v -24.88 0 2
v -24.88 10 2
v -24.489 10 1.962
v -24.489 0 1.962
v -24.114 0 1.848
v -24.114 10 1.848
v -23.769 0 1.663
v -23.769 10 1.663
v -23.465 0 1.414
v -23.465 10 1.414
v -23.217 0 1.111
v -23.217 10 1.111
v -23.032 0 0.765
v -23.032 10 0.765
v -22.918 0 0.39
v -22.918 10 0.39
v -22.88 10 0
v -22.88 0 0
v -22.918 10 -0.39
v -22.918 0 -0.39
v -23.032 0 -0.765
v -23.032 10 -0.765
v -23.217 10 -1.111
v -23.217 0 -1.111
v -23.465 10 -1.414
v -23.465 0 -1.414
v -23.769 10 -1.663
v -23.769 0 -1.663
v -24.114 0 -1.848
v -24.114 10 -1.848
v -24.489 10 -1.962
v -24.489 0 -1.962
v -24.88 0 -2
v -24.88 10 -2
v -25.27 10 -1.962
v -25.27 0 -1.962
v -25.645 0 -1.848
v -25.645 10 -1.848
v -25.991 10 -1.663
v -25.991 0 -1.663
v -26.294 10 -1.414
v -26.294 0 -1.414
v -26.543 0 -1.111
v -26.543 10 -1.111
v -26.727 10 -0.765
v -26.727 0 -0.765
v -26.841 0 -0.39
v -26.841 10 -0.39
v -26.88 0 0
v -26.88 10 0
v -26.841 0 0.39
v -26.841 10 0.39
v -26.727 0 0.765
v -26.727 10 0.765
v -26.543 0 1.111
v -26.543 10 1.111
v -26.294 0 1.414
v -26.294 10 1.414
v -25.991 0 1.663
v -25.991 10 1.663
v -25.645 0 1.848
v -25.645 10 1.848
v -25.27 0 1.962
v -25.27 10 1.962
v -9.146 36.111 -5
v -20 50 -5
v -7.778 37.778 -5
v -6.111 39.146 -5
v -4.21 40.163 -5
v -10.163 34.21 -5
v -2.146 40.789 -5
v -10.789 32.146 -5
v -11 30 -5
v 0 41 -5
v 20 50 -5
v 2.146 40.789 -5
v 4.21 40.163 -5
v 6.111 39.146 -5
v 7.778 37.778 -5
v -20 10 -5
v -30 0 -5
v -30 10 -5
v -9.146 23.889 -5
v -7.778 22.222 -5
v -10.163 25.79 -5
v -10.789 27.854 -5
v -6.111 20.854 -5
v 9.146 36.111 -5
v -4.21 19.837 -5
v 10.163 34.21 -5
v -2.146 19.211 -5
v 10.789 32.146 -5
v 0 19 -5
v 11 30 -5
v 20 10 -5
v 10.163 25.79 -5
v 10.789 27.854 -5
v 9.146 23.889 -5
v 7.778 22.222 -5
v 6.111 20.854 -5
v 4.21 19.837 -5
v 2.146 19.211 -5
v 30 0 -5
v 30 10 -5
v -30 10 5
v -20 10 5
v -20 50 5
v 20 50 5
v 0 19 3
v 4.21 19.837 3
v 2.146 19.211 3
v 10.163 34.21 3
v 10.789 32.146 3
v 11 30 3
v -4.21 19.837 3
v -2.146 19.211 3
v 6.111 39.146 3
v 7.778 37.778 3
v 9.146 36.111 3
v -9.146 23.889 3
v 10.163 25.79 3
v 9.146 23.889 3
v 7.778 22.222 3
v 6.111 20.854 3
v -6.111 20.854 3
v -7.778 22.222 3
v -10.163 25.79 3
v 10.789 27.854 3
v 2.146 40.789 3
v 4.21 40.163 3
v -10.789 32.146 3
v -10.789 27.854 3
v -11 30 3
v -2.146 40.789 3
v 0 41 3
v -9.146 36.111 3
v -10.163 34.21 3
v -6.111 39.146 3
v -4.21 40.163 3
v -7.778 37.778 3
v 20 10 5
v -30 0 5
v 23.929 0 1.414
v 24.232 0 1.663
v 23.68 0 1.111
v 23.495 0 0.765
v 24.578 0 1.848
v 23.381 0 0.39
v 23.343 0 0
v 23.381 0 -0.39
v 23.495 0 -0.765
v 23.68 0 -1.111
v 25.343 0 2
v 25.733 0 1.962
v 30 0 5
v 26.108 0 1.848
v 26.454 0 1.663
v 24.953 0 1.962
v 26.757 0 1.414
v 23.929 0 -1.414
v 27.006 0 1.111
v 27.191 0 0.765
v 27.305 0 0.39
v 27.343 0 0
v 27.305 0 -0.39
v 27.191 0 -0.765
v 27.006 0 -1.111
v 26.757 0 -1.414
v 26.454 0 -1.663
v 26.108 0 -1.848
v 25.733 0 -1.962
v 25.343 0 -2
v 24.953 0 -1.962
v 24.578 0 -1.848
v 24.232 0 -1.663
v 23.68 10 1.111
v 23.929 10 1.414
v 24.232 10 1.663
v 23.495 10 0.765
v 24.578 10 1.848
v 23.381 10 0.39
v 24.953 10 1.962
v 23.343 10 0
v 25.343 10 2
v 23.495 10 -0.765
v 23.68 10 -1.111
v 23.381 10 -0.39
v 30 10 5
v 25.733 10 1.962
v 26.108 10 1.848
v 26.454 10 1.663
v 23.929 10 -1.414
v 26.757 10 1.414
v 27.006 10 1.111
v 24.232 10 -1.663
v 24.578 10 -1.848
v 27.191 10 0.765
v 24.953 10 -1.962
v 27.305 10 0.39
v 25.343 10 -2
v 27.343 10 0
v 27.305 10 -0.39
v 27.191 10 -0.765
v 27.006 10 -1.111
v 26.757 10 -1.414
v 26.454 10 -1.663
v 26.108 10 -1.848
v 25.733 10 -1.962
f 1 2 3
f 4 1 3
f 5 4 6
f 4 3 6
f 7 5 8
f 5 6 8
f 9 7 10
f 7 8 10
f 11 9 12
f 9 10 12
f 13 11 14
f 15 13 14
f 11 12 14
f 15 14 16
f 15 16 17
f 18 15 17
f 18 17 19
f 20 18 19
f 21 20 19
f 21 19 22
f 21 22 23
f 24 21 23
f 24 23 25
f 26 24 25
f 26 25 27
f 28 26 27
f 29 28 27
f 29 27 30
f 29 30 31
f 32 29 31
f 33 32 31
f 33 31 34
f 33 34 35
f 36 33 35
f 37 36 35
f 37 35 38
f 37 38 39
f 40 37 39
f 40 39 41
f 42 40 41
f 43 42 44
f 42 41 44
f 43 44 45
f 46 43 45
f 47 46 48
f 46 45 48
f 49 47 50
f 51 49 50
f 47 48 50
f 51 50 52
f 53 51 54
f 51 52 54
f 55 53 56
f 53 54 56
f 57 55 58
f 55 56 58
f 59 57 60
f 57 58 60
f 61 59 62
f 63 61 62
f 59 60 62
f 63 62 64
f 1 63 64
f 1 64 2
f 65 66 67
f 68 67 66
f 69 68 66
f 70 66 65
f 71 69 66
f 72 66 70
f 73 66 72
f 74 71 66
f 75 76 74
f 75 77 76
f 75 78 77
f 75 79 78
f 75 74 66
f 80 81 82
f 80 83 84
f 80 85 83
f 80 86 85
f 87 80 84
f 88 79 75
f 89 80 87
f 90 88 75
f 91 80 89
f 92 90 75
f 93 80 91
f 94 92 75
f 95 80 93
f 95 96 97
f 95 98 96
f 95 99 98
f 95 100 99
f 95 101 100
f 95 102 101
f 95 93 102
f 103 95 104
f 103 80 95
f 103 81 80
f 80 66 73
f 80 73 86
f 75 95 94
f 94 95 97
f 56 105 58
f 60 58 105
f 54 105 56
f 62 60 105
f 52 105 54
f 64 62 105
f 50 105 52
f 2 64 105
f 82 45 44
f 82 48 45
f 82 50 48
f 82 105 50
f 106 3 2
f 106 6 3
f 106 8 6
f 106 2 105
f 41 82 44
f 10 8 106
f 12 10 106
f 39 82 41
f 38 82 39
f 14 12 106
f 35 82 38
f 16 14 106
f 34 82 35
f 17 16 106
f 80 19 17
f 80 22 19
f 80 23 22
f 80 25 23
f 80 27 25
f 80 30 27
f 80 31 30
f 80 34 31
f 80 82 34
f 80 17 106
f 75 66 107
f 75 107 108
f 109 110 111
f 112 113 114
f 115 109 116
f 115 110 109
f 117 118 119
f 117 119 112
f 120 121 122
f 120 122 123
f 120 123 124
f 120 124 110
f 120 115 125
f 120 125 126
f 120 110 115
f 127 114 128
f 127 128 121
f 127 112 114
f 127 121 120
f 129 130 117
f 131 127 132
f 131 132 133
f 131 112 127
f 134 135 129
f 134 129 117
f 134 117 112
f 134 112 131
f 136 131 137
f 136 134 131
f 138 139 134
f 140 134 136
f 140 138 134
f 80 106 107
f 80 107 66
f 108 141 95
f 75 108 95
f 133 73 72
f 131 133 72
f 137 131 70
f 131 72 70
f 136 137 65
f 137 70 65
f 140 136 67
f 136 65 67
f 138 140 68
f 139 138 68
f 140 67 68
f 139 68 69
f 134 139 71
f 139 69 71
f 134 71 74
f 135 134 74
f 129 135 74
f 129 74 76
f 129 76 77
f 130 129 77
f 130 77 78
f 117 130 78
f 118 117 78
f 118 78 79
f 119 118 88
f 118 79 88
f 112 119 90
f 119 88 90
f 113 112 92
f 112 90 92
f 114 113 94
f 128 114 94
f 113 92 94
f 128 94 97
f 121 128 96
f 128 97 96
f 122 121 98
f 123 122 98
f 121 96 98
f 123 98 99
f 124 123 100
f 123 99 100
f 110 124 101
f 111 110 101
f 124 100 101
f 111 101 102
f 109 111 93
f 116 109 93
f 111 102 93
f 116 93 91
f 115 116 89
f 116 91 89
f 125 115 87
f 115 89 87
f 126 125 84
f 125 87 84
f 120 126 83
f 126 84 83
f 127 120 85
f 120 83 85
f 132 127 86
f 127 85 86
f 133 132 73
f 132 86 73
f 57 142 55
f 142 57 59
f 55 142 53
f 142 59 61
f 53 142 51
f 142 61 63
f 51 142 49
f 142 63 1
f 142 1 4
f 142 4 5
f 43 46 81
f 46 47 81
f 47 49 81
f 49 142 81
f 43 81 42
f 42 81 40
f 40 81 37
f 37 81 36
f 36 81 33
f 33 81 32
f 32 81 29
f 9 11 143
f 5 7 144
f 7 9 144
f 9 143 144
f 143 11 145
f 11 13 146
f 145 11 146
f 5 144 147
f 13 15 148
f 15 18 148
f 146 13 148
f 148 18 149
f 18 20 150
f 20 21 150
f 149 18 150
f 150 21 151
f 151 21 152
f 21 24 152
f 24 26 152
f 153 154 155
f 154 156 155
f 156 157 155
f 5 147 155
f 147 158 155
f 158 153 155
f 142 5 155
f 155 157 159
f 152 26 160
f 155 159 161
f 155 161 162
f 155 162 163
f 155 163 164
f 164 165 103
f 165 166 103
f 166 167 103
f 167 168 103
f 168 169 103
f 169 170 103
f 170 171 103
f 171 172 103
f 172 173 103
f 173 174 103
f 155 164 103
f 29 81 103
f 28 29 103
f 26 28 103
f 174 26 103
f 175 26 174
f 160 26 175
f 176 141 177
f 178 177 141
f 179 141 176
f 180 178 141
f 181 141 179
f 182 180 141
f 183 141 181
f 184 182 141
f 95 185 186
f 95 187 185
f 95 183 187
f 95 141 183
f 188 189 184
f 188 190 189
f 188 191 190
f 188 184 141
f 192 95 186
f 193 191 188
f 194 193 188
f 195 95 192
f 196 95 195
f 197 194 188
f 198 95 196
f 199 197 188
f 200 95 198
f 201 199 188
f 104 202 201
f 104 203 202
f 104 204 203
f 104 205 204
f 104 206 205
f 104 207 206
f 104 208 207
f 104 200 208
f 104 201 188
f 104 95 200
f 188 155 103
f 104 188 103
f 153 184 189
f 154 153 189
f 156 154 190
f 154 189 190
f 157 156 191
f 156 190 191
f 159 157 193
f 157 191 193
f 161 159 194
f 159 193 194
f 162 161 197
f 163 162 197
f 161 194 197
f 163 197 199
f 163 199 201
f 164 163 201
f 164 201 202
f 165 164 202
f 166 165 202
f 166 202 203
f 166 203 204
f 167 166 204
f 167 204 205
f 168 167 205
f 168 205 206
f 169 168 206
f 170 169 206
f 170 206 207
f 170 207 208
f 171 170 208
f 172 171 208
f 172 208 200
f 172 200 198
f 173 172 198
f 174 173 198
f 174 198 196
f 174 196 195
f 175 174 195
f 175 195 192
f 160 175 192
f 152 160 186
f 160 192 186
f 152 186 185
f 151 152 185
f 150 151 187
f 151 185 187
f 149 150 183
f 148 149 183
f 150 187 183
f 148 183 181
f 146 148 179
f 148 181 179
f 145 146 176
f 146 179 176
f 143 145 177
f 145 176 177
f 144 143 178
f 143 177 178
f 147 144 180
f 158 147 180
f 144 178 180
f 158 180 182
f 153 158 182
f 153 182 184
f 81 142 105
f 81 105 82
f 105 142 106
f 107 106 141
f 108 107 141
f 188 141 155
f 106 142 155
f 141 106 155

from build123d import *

# Parameters (mm, degrees)
SKETCH1_W           = 60
SKETCH1_H           = 10
BOSS_EXTRUDE1_DEPTH = 10
SKETCH2_W           = 40
SKETCH2_H           = 10
BOSS_EXTRUDE2_DEPTH = 40
SKETCH3_R           = 11
CUT_EXTRUDE1_DEPTH  = 8
SKETCH5_R           = 2
CUT_EXTRUDE2_DEPTH  = 45


with BuildPart() as part:
    # Sketch1 → Boss-Extrude1 (new body)
    with BuildSketch(Plane(origin=(0, 0, 0), x_dir=(1, 0, 0), z_dir=(0, 1, 0))):
        Rectangle(SKETCH1_W, SKETCH1_H)
    extrude(amount=BOSS_EXTRUDE1_DEPTH)

    # Sketch2 → Boss-Extrude2 (add)
    with BuildSketch(Plane(origin=(0, 10, 0), x_dir=(1, 0, 0), z_dir=(0, 1, 0))):
        Rectangle(SKETCH2_W, SKETCH2_H)
    extrude(amount=BOSS_EXTRUDE2_DEPTH)

    # Sketch3 → Cut-Extrude1 (cut)
    with BuildSketch(Plane(origin=(0, 0, -5), x_dir=(-1, 0, 0), z_dir=(0, 0, -1))):
        with Locations((0, 30)):
            Circle(SKETCH3_R)
    extrude(amount=-CUT_EXTRUDE1_DEPTH, mode=Mode.SUBTRACT)

    # Sketch5 → Cut-Extrude2 (cut)
    with BuildSketch(Plane(origin=(0, 10, 0), x_dir=(1, 0, 0), z_dir=(0, 1, 0))):
        with Locations(Location((-24.879663673, 0, 0), (0, 0, 270))):
            Circle(SKETCH5_R)
        with Locations(Location((25.342956813, 0, 0), (0, 0, 270))):
            Circle(SKETCH5_R)
    extrude(amount=-CUT_EXTRUDE2_DEPTH, mode=Mode.SUBTRACT)


solid = part.part
